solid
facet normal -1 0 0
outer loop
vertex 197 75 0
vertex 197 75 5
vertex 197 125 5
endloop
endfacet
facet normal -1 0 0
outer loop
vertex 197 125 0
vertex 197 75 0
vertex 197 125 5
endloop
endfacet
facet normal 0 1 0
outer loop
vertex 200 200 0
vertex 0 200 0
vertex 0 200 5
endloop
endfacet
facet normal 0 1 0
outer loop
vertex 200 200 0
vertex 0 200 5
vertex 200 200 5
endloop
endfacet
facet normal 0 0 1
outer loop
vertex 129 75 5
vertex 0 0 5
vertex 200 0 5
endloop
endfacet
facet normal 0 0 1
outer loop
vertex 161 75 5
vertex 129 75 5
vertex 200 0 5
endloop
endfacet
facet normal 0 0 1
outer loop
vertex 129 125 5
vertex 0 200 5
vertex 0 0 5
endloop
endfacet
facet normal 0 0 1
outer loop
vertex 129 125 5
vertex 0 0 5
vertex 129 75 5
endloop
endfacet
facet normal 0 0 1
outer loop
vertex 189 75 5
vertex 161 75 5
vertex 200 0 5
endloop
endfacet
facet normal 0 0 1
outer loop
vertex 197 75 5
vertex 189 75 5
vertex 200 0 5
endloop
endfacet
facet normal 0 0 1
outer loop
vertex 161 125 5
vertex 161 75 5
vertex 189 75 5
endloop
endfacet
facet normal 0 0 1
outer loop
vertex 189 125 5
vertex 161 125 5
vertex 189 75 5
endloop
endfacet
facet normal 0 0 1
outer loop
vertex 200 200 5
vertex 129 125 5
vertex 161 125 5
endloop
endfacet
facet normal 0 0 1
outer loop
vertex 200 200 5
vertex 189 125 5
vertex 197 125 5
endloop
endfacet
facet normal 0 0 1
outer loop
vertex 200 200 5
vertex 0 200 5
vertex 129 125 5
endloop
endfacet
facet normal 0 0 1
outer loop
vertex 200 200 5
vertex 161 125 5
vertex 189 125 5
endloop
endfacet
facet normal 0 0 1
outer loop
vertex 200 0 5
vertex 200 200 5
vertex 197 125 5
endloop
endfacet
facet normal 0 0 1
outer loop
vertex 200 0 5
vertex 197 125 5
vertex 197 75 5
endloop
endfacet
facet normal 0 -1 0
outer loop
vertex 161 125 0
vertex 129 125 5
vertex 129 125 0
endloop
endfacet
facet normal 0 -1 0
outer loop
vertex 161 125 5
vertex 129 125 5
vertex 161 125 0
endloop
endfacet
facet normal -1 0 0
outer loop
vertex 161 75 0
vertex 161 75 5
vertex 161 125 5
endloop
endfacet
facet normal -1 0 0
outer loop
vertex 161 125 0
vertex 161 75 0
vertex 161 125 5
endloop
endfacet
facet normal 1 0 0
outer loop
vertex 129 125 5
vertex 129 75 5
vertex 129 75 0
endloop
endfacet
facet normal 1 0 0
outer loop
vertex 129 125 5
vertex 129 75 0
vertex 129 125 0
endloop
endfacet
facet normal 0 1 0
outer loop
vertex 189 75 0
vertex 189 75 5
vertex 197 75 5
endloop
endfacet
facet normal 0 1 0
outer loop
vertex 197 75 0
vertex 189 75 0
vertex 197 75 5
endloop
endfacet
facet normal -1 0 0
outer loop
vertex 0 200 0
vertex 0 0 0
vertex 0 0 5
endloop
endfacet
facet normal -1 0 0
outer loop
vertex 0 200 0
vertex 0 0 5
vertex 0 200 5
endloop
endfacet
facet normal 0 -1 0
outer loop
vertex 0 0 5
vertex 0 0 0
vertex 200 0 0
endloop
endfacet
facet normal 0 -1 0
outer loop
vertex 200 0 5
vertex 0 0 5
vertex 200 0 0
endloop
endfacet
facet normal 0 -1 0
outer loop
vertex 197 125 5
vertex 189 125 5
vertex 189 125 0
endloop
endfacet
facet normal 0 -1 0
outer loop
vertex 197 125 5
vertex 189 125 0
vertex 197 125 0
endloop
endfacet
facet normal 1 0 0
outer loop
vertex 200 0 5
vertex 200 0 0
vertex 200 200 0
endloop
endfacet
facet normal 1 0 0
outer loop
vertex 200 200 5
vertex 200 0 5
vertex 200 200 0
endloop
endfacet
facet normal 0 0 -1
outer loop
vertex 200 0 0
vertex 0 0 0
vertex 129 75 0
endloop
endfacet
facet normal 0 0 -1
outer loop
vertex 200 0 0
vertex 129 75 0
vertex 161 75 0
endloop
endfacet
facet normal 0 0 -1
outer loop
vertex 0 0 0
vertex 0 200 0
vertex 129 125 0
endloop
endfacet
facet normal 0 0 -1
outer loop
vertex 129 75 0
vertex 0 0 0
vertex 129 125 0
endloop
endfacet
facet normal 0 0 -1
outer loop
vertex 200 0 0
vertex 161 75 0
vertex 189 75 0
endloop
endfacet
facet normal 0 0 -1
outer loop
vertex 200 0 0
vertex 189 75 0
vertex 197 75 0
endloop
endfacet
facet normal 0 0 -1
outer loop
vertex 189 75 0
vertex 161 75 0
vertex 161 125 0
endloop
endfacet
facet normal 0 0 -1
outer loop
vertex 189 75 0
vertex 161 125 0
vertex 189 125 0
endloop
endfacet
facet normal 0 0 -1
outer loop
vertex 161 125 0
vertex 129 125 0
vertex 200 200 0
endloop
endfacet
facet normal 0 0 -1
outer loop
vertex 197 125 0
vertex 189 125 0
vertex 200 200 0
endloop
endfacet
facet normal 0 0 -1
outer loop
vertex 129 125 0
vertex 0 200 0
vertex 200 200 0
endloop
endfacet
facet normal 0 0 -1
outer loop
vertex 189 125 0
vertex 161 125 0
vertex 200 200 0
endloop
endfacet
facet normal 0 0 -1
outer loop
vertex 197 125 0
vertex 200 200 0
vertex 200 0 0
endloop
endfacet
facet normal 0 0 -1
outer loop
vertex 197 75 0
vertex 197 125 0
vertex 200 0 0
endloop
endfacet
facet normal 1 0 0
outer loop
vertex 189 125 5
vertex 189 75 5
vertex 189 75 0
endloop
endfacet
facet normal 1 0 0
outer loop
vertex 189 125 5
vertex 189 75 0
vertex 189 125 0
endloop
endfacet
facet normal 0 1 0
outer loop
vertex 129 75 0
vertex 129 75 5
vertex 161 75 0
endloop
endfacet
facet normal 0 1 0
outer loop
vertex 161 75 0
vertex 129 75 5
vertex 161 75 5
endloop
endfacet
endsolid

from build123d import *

# Parameters (mm, degrees)
ESQUISSE1_W             = 200
ESQUISSE1_H             = 200
BOSS_EXTRU_1_DEPTH      = 5
ESQUISSE2_W             = 8
ESQUISSE2_H             = 50
ENL_V_MAT_EXTRU_1_DEPTH = 5
ESQUISSE3_W             = 32
ESQUISSE3_H             = 50
ENL_V_MAT_EXTRU_2_DEPTH = 5


with BuildPart() as part:
    # Esquisse1 → Boss.-Extru.1 (new body)
    with BuildSketch(Plane.XY):
        with Locations((100, 100)):
            Rectangle(ESQUISSE1_W, ESQUISSE1_H)
    extrude(amount=BOSS_EXTRU_1_DEPTH)

    # Esquisse2 → Enlèv. mat.-Extru.1 (cut)
    with BuildSketch(Plane.XY.offset(5)):
        with Locations((193, 100)):
            Rectangle(ESQUISSE2_W, ESQUISSE2_H)
    extrude(amount=-ENL_V_MAT_EXTRU_1_DEPTH, mode=Mode.SUBTRACT)

    # Esquisse3 → Enlèv. mat.-Extru.2 (cut)
    with BuildSketch(Plane.XY.offset(5)):
        with Locations((145, 100)):
            Rectangle(ESQUISSE3_W, ESQUISSE3_H)
    extrude(amount=-ENL_V_MAT_EXTRU_2_DEPTH, mode=Mode.SUBTRACT)


solid = part.part
